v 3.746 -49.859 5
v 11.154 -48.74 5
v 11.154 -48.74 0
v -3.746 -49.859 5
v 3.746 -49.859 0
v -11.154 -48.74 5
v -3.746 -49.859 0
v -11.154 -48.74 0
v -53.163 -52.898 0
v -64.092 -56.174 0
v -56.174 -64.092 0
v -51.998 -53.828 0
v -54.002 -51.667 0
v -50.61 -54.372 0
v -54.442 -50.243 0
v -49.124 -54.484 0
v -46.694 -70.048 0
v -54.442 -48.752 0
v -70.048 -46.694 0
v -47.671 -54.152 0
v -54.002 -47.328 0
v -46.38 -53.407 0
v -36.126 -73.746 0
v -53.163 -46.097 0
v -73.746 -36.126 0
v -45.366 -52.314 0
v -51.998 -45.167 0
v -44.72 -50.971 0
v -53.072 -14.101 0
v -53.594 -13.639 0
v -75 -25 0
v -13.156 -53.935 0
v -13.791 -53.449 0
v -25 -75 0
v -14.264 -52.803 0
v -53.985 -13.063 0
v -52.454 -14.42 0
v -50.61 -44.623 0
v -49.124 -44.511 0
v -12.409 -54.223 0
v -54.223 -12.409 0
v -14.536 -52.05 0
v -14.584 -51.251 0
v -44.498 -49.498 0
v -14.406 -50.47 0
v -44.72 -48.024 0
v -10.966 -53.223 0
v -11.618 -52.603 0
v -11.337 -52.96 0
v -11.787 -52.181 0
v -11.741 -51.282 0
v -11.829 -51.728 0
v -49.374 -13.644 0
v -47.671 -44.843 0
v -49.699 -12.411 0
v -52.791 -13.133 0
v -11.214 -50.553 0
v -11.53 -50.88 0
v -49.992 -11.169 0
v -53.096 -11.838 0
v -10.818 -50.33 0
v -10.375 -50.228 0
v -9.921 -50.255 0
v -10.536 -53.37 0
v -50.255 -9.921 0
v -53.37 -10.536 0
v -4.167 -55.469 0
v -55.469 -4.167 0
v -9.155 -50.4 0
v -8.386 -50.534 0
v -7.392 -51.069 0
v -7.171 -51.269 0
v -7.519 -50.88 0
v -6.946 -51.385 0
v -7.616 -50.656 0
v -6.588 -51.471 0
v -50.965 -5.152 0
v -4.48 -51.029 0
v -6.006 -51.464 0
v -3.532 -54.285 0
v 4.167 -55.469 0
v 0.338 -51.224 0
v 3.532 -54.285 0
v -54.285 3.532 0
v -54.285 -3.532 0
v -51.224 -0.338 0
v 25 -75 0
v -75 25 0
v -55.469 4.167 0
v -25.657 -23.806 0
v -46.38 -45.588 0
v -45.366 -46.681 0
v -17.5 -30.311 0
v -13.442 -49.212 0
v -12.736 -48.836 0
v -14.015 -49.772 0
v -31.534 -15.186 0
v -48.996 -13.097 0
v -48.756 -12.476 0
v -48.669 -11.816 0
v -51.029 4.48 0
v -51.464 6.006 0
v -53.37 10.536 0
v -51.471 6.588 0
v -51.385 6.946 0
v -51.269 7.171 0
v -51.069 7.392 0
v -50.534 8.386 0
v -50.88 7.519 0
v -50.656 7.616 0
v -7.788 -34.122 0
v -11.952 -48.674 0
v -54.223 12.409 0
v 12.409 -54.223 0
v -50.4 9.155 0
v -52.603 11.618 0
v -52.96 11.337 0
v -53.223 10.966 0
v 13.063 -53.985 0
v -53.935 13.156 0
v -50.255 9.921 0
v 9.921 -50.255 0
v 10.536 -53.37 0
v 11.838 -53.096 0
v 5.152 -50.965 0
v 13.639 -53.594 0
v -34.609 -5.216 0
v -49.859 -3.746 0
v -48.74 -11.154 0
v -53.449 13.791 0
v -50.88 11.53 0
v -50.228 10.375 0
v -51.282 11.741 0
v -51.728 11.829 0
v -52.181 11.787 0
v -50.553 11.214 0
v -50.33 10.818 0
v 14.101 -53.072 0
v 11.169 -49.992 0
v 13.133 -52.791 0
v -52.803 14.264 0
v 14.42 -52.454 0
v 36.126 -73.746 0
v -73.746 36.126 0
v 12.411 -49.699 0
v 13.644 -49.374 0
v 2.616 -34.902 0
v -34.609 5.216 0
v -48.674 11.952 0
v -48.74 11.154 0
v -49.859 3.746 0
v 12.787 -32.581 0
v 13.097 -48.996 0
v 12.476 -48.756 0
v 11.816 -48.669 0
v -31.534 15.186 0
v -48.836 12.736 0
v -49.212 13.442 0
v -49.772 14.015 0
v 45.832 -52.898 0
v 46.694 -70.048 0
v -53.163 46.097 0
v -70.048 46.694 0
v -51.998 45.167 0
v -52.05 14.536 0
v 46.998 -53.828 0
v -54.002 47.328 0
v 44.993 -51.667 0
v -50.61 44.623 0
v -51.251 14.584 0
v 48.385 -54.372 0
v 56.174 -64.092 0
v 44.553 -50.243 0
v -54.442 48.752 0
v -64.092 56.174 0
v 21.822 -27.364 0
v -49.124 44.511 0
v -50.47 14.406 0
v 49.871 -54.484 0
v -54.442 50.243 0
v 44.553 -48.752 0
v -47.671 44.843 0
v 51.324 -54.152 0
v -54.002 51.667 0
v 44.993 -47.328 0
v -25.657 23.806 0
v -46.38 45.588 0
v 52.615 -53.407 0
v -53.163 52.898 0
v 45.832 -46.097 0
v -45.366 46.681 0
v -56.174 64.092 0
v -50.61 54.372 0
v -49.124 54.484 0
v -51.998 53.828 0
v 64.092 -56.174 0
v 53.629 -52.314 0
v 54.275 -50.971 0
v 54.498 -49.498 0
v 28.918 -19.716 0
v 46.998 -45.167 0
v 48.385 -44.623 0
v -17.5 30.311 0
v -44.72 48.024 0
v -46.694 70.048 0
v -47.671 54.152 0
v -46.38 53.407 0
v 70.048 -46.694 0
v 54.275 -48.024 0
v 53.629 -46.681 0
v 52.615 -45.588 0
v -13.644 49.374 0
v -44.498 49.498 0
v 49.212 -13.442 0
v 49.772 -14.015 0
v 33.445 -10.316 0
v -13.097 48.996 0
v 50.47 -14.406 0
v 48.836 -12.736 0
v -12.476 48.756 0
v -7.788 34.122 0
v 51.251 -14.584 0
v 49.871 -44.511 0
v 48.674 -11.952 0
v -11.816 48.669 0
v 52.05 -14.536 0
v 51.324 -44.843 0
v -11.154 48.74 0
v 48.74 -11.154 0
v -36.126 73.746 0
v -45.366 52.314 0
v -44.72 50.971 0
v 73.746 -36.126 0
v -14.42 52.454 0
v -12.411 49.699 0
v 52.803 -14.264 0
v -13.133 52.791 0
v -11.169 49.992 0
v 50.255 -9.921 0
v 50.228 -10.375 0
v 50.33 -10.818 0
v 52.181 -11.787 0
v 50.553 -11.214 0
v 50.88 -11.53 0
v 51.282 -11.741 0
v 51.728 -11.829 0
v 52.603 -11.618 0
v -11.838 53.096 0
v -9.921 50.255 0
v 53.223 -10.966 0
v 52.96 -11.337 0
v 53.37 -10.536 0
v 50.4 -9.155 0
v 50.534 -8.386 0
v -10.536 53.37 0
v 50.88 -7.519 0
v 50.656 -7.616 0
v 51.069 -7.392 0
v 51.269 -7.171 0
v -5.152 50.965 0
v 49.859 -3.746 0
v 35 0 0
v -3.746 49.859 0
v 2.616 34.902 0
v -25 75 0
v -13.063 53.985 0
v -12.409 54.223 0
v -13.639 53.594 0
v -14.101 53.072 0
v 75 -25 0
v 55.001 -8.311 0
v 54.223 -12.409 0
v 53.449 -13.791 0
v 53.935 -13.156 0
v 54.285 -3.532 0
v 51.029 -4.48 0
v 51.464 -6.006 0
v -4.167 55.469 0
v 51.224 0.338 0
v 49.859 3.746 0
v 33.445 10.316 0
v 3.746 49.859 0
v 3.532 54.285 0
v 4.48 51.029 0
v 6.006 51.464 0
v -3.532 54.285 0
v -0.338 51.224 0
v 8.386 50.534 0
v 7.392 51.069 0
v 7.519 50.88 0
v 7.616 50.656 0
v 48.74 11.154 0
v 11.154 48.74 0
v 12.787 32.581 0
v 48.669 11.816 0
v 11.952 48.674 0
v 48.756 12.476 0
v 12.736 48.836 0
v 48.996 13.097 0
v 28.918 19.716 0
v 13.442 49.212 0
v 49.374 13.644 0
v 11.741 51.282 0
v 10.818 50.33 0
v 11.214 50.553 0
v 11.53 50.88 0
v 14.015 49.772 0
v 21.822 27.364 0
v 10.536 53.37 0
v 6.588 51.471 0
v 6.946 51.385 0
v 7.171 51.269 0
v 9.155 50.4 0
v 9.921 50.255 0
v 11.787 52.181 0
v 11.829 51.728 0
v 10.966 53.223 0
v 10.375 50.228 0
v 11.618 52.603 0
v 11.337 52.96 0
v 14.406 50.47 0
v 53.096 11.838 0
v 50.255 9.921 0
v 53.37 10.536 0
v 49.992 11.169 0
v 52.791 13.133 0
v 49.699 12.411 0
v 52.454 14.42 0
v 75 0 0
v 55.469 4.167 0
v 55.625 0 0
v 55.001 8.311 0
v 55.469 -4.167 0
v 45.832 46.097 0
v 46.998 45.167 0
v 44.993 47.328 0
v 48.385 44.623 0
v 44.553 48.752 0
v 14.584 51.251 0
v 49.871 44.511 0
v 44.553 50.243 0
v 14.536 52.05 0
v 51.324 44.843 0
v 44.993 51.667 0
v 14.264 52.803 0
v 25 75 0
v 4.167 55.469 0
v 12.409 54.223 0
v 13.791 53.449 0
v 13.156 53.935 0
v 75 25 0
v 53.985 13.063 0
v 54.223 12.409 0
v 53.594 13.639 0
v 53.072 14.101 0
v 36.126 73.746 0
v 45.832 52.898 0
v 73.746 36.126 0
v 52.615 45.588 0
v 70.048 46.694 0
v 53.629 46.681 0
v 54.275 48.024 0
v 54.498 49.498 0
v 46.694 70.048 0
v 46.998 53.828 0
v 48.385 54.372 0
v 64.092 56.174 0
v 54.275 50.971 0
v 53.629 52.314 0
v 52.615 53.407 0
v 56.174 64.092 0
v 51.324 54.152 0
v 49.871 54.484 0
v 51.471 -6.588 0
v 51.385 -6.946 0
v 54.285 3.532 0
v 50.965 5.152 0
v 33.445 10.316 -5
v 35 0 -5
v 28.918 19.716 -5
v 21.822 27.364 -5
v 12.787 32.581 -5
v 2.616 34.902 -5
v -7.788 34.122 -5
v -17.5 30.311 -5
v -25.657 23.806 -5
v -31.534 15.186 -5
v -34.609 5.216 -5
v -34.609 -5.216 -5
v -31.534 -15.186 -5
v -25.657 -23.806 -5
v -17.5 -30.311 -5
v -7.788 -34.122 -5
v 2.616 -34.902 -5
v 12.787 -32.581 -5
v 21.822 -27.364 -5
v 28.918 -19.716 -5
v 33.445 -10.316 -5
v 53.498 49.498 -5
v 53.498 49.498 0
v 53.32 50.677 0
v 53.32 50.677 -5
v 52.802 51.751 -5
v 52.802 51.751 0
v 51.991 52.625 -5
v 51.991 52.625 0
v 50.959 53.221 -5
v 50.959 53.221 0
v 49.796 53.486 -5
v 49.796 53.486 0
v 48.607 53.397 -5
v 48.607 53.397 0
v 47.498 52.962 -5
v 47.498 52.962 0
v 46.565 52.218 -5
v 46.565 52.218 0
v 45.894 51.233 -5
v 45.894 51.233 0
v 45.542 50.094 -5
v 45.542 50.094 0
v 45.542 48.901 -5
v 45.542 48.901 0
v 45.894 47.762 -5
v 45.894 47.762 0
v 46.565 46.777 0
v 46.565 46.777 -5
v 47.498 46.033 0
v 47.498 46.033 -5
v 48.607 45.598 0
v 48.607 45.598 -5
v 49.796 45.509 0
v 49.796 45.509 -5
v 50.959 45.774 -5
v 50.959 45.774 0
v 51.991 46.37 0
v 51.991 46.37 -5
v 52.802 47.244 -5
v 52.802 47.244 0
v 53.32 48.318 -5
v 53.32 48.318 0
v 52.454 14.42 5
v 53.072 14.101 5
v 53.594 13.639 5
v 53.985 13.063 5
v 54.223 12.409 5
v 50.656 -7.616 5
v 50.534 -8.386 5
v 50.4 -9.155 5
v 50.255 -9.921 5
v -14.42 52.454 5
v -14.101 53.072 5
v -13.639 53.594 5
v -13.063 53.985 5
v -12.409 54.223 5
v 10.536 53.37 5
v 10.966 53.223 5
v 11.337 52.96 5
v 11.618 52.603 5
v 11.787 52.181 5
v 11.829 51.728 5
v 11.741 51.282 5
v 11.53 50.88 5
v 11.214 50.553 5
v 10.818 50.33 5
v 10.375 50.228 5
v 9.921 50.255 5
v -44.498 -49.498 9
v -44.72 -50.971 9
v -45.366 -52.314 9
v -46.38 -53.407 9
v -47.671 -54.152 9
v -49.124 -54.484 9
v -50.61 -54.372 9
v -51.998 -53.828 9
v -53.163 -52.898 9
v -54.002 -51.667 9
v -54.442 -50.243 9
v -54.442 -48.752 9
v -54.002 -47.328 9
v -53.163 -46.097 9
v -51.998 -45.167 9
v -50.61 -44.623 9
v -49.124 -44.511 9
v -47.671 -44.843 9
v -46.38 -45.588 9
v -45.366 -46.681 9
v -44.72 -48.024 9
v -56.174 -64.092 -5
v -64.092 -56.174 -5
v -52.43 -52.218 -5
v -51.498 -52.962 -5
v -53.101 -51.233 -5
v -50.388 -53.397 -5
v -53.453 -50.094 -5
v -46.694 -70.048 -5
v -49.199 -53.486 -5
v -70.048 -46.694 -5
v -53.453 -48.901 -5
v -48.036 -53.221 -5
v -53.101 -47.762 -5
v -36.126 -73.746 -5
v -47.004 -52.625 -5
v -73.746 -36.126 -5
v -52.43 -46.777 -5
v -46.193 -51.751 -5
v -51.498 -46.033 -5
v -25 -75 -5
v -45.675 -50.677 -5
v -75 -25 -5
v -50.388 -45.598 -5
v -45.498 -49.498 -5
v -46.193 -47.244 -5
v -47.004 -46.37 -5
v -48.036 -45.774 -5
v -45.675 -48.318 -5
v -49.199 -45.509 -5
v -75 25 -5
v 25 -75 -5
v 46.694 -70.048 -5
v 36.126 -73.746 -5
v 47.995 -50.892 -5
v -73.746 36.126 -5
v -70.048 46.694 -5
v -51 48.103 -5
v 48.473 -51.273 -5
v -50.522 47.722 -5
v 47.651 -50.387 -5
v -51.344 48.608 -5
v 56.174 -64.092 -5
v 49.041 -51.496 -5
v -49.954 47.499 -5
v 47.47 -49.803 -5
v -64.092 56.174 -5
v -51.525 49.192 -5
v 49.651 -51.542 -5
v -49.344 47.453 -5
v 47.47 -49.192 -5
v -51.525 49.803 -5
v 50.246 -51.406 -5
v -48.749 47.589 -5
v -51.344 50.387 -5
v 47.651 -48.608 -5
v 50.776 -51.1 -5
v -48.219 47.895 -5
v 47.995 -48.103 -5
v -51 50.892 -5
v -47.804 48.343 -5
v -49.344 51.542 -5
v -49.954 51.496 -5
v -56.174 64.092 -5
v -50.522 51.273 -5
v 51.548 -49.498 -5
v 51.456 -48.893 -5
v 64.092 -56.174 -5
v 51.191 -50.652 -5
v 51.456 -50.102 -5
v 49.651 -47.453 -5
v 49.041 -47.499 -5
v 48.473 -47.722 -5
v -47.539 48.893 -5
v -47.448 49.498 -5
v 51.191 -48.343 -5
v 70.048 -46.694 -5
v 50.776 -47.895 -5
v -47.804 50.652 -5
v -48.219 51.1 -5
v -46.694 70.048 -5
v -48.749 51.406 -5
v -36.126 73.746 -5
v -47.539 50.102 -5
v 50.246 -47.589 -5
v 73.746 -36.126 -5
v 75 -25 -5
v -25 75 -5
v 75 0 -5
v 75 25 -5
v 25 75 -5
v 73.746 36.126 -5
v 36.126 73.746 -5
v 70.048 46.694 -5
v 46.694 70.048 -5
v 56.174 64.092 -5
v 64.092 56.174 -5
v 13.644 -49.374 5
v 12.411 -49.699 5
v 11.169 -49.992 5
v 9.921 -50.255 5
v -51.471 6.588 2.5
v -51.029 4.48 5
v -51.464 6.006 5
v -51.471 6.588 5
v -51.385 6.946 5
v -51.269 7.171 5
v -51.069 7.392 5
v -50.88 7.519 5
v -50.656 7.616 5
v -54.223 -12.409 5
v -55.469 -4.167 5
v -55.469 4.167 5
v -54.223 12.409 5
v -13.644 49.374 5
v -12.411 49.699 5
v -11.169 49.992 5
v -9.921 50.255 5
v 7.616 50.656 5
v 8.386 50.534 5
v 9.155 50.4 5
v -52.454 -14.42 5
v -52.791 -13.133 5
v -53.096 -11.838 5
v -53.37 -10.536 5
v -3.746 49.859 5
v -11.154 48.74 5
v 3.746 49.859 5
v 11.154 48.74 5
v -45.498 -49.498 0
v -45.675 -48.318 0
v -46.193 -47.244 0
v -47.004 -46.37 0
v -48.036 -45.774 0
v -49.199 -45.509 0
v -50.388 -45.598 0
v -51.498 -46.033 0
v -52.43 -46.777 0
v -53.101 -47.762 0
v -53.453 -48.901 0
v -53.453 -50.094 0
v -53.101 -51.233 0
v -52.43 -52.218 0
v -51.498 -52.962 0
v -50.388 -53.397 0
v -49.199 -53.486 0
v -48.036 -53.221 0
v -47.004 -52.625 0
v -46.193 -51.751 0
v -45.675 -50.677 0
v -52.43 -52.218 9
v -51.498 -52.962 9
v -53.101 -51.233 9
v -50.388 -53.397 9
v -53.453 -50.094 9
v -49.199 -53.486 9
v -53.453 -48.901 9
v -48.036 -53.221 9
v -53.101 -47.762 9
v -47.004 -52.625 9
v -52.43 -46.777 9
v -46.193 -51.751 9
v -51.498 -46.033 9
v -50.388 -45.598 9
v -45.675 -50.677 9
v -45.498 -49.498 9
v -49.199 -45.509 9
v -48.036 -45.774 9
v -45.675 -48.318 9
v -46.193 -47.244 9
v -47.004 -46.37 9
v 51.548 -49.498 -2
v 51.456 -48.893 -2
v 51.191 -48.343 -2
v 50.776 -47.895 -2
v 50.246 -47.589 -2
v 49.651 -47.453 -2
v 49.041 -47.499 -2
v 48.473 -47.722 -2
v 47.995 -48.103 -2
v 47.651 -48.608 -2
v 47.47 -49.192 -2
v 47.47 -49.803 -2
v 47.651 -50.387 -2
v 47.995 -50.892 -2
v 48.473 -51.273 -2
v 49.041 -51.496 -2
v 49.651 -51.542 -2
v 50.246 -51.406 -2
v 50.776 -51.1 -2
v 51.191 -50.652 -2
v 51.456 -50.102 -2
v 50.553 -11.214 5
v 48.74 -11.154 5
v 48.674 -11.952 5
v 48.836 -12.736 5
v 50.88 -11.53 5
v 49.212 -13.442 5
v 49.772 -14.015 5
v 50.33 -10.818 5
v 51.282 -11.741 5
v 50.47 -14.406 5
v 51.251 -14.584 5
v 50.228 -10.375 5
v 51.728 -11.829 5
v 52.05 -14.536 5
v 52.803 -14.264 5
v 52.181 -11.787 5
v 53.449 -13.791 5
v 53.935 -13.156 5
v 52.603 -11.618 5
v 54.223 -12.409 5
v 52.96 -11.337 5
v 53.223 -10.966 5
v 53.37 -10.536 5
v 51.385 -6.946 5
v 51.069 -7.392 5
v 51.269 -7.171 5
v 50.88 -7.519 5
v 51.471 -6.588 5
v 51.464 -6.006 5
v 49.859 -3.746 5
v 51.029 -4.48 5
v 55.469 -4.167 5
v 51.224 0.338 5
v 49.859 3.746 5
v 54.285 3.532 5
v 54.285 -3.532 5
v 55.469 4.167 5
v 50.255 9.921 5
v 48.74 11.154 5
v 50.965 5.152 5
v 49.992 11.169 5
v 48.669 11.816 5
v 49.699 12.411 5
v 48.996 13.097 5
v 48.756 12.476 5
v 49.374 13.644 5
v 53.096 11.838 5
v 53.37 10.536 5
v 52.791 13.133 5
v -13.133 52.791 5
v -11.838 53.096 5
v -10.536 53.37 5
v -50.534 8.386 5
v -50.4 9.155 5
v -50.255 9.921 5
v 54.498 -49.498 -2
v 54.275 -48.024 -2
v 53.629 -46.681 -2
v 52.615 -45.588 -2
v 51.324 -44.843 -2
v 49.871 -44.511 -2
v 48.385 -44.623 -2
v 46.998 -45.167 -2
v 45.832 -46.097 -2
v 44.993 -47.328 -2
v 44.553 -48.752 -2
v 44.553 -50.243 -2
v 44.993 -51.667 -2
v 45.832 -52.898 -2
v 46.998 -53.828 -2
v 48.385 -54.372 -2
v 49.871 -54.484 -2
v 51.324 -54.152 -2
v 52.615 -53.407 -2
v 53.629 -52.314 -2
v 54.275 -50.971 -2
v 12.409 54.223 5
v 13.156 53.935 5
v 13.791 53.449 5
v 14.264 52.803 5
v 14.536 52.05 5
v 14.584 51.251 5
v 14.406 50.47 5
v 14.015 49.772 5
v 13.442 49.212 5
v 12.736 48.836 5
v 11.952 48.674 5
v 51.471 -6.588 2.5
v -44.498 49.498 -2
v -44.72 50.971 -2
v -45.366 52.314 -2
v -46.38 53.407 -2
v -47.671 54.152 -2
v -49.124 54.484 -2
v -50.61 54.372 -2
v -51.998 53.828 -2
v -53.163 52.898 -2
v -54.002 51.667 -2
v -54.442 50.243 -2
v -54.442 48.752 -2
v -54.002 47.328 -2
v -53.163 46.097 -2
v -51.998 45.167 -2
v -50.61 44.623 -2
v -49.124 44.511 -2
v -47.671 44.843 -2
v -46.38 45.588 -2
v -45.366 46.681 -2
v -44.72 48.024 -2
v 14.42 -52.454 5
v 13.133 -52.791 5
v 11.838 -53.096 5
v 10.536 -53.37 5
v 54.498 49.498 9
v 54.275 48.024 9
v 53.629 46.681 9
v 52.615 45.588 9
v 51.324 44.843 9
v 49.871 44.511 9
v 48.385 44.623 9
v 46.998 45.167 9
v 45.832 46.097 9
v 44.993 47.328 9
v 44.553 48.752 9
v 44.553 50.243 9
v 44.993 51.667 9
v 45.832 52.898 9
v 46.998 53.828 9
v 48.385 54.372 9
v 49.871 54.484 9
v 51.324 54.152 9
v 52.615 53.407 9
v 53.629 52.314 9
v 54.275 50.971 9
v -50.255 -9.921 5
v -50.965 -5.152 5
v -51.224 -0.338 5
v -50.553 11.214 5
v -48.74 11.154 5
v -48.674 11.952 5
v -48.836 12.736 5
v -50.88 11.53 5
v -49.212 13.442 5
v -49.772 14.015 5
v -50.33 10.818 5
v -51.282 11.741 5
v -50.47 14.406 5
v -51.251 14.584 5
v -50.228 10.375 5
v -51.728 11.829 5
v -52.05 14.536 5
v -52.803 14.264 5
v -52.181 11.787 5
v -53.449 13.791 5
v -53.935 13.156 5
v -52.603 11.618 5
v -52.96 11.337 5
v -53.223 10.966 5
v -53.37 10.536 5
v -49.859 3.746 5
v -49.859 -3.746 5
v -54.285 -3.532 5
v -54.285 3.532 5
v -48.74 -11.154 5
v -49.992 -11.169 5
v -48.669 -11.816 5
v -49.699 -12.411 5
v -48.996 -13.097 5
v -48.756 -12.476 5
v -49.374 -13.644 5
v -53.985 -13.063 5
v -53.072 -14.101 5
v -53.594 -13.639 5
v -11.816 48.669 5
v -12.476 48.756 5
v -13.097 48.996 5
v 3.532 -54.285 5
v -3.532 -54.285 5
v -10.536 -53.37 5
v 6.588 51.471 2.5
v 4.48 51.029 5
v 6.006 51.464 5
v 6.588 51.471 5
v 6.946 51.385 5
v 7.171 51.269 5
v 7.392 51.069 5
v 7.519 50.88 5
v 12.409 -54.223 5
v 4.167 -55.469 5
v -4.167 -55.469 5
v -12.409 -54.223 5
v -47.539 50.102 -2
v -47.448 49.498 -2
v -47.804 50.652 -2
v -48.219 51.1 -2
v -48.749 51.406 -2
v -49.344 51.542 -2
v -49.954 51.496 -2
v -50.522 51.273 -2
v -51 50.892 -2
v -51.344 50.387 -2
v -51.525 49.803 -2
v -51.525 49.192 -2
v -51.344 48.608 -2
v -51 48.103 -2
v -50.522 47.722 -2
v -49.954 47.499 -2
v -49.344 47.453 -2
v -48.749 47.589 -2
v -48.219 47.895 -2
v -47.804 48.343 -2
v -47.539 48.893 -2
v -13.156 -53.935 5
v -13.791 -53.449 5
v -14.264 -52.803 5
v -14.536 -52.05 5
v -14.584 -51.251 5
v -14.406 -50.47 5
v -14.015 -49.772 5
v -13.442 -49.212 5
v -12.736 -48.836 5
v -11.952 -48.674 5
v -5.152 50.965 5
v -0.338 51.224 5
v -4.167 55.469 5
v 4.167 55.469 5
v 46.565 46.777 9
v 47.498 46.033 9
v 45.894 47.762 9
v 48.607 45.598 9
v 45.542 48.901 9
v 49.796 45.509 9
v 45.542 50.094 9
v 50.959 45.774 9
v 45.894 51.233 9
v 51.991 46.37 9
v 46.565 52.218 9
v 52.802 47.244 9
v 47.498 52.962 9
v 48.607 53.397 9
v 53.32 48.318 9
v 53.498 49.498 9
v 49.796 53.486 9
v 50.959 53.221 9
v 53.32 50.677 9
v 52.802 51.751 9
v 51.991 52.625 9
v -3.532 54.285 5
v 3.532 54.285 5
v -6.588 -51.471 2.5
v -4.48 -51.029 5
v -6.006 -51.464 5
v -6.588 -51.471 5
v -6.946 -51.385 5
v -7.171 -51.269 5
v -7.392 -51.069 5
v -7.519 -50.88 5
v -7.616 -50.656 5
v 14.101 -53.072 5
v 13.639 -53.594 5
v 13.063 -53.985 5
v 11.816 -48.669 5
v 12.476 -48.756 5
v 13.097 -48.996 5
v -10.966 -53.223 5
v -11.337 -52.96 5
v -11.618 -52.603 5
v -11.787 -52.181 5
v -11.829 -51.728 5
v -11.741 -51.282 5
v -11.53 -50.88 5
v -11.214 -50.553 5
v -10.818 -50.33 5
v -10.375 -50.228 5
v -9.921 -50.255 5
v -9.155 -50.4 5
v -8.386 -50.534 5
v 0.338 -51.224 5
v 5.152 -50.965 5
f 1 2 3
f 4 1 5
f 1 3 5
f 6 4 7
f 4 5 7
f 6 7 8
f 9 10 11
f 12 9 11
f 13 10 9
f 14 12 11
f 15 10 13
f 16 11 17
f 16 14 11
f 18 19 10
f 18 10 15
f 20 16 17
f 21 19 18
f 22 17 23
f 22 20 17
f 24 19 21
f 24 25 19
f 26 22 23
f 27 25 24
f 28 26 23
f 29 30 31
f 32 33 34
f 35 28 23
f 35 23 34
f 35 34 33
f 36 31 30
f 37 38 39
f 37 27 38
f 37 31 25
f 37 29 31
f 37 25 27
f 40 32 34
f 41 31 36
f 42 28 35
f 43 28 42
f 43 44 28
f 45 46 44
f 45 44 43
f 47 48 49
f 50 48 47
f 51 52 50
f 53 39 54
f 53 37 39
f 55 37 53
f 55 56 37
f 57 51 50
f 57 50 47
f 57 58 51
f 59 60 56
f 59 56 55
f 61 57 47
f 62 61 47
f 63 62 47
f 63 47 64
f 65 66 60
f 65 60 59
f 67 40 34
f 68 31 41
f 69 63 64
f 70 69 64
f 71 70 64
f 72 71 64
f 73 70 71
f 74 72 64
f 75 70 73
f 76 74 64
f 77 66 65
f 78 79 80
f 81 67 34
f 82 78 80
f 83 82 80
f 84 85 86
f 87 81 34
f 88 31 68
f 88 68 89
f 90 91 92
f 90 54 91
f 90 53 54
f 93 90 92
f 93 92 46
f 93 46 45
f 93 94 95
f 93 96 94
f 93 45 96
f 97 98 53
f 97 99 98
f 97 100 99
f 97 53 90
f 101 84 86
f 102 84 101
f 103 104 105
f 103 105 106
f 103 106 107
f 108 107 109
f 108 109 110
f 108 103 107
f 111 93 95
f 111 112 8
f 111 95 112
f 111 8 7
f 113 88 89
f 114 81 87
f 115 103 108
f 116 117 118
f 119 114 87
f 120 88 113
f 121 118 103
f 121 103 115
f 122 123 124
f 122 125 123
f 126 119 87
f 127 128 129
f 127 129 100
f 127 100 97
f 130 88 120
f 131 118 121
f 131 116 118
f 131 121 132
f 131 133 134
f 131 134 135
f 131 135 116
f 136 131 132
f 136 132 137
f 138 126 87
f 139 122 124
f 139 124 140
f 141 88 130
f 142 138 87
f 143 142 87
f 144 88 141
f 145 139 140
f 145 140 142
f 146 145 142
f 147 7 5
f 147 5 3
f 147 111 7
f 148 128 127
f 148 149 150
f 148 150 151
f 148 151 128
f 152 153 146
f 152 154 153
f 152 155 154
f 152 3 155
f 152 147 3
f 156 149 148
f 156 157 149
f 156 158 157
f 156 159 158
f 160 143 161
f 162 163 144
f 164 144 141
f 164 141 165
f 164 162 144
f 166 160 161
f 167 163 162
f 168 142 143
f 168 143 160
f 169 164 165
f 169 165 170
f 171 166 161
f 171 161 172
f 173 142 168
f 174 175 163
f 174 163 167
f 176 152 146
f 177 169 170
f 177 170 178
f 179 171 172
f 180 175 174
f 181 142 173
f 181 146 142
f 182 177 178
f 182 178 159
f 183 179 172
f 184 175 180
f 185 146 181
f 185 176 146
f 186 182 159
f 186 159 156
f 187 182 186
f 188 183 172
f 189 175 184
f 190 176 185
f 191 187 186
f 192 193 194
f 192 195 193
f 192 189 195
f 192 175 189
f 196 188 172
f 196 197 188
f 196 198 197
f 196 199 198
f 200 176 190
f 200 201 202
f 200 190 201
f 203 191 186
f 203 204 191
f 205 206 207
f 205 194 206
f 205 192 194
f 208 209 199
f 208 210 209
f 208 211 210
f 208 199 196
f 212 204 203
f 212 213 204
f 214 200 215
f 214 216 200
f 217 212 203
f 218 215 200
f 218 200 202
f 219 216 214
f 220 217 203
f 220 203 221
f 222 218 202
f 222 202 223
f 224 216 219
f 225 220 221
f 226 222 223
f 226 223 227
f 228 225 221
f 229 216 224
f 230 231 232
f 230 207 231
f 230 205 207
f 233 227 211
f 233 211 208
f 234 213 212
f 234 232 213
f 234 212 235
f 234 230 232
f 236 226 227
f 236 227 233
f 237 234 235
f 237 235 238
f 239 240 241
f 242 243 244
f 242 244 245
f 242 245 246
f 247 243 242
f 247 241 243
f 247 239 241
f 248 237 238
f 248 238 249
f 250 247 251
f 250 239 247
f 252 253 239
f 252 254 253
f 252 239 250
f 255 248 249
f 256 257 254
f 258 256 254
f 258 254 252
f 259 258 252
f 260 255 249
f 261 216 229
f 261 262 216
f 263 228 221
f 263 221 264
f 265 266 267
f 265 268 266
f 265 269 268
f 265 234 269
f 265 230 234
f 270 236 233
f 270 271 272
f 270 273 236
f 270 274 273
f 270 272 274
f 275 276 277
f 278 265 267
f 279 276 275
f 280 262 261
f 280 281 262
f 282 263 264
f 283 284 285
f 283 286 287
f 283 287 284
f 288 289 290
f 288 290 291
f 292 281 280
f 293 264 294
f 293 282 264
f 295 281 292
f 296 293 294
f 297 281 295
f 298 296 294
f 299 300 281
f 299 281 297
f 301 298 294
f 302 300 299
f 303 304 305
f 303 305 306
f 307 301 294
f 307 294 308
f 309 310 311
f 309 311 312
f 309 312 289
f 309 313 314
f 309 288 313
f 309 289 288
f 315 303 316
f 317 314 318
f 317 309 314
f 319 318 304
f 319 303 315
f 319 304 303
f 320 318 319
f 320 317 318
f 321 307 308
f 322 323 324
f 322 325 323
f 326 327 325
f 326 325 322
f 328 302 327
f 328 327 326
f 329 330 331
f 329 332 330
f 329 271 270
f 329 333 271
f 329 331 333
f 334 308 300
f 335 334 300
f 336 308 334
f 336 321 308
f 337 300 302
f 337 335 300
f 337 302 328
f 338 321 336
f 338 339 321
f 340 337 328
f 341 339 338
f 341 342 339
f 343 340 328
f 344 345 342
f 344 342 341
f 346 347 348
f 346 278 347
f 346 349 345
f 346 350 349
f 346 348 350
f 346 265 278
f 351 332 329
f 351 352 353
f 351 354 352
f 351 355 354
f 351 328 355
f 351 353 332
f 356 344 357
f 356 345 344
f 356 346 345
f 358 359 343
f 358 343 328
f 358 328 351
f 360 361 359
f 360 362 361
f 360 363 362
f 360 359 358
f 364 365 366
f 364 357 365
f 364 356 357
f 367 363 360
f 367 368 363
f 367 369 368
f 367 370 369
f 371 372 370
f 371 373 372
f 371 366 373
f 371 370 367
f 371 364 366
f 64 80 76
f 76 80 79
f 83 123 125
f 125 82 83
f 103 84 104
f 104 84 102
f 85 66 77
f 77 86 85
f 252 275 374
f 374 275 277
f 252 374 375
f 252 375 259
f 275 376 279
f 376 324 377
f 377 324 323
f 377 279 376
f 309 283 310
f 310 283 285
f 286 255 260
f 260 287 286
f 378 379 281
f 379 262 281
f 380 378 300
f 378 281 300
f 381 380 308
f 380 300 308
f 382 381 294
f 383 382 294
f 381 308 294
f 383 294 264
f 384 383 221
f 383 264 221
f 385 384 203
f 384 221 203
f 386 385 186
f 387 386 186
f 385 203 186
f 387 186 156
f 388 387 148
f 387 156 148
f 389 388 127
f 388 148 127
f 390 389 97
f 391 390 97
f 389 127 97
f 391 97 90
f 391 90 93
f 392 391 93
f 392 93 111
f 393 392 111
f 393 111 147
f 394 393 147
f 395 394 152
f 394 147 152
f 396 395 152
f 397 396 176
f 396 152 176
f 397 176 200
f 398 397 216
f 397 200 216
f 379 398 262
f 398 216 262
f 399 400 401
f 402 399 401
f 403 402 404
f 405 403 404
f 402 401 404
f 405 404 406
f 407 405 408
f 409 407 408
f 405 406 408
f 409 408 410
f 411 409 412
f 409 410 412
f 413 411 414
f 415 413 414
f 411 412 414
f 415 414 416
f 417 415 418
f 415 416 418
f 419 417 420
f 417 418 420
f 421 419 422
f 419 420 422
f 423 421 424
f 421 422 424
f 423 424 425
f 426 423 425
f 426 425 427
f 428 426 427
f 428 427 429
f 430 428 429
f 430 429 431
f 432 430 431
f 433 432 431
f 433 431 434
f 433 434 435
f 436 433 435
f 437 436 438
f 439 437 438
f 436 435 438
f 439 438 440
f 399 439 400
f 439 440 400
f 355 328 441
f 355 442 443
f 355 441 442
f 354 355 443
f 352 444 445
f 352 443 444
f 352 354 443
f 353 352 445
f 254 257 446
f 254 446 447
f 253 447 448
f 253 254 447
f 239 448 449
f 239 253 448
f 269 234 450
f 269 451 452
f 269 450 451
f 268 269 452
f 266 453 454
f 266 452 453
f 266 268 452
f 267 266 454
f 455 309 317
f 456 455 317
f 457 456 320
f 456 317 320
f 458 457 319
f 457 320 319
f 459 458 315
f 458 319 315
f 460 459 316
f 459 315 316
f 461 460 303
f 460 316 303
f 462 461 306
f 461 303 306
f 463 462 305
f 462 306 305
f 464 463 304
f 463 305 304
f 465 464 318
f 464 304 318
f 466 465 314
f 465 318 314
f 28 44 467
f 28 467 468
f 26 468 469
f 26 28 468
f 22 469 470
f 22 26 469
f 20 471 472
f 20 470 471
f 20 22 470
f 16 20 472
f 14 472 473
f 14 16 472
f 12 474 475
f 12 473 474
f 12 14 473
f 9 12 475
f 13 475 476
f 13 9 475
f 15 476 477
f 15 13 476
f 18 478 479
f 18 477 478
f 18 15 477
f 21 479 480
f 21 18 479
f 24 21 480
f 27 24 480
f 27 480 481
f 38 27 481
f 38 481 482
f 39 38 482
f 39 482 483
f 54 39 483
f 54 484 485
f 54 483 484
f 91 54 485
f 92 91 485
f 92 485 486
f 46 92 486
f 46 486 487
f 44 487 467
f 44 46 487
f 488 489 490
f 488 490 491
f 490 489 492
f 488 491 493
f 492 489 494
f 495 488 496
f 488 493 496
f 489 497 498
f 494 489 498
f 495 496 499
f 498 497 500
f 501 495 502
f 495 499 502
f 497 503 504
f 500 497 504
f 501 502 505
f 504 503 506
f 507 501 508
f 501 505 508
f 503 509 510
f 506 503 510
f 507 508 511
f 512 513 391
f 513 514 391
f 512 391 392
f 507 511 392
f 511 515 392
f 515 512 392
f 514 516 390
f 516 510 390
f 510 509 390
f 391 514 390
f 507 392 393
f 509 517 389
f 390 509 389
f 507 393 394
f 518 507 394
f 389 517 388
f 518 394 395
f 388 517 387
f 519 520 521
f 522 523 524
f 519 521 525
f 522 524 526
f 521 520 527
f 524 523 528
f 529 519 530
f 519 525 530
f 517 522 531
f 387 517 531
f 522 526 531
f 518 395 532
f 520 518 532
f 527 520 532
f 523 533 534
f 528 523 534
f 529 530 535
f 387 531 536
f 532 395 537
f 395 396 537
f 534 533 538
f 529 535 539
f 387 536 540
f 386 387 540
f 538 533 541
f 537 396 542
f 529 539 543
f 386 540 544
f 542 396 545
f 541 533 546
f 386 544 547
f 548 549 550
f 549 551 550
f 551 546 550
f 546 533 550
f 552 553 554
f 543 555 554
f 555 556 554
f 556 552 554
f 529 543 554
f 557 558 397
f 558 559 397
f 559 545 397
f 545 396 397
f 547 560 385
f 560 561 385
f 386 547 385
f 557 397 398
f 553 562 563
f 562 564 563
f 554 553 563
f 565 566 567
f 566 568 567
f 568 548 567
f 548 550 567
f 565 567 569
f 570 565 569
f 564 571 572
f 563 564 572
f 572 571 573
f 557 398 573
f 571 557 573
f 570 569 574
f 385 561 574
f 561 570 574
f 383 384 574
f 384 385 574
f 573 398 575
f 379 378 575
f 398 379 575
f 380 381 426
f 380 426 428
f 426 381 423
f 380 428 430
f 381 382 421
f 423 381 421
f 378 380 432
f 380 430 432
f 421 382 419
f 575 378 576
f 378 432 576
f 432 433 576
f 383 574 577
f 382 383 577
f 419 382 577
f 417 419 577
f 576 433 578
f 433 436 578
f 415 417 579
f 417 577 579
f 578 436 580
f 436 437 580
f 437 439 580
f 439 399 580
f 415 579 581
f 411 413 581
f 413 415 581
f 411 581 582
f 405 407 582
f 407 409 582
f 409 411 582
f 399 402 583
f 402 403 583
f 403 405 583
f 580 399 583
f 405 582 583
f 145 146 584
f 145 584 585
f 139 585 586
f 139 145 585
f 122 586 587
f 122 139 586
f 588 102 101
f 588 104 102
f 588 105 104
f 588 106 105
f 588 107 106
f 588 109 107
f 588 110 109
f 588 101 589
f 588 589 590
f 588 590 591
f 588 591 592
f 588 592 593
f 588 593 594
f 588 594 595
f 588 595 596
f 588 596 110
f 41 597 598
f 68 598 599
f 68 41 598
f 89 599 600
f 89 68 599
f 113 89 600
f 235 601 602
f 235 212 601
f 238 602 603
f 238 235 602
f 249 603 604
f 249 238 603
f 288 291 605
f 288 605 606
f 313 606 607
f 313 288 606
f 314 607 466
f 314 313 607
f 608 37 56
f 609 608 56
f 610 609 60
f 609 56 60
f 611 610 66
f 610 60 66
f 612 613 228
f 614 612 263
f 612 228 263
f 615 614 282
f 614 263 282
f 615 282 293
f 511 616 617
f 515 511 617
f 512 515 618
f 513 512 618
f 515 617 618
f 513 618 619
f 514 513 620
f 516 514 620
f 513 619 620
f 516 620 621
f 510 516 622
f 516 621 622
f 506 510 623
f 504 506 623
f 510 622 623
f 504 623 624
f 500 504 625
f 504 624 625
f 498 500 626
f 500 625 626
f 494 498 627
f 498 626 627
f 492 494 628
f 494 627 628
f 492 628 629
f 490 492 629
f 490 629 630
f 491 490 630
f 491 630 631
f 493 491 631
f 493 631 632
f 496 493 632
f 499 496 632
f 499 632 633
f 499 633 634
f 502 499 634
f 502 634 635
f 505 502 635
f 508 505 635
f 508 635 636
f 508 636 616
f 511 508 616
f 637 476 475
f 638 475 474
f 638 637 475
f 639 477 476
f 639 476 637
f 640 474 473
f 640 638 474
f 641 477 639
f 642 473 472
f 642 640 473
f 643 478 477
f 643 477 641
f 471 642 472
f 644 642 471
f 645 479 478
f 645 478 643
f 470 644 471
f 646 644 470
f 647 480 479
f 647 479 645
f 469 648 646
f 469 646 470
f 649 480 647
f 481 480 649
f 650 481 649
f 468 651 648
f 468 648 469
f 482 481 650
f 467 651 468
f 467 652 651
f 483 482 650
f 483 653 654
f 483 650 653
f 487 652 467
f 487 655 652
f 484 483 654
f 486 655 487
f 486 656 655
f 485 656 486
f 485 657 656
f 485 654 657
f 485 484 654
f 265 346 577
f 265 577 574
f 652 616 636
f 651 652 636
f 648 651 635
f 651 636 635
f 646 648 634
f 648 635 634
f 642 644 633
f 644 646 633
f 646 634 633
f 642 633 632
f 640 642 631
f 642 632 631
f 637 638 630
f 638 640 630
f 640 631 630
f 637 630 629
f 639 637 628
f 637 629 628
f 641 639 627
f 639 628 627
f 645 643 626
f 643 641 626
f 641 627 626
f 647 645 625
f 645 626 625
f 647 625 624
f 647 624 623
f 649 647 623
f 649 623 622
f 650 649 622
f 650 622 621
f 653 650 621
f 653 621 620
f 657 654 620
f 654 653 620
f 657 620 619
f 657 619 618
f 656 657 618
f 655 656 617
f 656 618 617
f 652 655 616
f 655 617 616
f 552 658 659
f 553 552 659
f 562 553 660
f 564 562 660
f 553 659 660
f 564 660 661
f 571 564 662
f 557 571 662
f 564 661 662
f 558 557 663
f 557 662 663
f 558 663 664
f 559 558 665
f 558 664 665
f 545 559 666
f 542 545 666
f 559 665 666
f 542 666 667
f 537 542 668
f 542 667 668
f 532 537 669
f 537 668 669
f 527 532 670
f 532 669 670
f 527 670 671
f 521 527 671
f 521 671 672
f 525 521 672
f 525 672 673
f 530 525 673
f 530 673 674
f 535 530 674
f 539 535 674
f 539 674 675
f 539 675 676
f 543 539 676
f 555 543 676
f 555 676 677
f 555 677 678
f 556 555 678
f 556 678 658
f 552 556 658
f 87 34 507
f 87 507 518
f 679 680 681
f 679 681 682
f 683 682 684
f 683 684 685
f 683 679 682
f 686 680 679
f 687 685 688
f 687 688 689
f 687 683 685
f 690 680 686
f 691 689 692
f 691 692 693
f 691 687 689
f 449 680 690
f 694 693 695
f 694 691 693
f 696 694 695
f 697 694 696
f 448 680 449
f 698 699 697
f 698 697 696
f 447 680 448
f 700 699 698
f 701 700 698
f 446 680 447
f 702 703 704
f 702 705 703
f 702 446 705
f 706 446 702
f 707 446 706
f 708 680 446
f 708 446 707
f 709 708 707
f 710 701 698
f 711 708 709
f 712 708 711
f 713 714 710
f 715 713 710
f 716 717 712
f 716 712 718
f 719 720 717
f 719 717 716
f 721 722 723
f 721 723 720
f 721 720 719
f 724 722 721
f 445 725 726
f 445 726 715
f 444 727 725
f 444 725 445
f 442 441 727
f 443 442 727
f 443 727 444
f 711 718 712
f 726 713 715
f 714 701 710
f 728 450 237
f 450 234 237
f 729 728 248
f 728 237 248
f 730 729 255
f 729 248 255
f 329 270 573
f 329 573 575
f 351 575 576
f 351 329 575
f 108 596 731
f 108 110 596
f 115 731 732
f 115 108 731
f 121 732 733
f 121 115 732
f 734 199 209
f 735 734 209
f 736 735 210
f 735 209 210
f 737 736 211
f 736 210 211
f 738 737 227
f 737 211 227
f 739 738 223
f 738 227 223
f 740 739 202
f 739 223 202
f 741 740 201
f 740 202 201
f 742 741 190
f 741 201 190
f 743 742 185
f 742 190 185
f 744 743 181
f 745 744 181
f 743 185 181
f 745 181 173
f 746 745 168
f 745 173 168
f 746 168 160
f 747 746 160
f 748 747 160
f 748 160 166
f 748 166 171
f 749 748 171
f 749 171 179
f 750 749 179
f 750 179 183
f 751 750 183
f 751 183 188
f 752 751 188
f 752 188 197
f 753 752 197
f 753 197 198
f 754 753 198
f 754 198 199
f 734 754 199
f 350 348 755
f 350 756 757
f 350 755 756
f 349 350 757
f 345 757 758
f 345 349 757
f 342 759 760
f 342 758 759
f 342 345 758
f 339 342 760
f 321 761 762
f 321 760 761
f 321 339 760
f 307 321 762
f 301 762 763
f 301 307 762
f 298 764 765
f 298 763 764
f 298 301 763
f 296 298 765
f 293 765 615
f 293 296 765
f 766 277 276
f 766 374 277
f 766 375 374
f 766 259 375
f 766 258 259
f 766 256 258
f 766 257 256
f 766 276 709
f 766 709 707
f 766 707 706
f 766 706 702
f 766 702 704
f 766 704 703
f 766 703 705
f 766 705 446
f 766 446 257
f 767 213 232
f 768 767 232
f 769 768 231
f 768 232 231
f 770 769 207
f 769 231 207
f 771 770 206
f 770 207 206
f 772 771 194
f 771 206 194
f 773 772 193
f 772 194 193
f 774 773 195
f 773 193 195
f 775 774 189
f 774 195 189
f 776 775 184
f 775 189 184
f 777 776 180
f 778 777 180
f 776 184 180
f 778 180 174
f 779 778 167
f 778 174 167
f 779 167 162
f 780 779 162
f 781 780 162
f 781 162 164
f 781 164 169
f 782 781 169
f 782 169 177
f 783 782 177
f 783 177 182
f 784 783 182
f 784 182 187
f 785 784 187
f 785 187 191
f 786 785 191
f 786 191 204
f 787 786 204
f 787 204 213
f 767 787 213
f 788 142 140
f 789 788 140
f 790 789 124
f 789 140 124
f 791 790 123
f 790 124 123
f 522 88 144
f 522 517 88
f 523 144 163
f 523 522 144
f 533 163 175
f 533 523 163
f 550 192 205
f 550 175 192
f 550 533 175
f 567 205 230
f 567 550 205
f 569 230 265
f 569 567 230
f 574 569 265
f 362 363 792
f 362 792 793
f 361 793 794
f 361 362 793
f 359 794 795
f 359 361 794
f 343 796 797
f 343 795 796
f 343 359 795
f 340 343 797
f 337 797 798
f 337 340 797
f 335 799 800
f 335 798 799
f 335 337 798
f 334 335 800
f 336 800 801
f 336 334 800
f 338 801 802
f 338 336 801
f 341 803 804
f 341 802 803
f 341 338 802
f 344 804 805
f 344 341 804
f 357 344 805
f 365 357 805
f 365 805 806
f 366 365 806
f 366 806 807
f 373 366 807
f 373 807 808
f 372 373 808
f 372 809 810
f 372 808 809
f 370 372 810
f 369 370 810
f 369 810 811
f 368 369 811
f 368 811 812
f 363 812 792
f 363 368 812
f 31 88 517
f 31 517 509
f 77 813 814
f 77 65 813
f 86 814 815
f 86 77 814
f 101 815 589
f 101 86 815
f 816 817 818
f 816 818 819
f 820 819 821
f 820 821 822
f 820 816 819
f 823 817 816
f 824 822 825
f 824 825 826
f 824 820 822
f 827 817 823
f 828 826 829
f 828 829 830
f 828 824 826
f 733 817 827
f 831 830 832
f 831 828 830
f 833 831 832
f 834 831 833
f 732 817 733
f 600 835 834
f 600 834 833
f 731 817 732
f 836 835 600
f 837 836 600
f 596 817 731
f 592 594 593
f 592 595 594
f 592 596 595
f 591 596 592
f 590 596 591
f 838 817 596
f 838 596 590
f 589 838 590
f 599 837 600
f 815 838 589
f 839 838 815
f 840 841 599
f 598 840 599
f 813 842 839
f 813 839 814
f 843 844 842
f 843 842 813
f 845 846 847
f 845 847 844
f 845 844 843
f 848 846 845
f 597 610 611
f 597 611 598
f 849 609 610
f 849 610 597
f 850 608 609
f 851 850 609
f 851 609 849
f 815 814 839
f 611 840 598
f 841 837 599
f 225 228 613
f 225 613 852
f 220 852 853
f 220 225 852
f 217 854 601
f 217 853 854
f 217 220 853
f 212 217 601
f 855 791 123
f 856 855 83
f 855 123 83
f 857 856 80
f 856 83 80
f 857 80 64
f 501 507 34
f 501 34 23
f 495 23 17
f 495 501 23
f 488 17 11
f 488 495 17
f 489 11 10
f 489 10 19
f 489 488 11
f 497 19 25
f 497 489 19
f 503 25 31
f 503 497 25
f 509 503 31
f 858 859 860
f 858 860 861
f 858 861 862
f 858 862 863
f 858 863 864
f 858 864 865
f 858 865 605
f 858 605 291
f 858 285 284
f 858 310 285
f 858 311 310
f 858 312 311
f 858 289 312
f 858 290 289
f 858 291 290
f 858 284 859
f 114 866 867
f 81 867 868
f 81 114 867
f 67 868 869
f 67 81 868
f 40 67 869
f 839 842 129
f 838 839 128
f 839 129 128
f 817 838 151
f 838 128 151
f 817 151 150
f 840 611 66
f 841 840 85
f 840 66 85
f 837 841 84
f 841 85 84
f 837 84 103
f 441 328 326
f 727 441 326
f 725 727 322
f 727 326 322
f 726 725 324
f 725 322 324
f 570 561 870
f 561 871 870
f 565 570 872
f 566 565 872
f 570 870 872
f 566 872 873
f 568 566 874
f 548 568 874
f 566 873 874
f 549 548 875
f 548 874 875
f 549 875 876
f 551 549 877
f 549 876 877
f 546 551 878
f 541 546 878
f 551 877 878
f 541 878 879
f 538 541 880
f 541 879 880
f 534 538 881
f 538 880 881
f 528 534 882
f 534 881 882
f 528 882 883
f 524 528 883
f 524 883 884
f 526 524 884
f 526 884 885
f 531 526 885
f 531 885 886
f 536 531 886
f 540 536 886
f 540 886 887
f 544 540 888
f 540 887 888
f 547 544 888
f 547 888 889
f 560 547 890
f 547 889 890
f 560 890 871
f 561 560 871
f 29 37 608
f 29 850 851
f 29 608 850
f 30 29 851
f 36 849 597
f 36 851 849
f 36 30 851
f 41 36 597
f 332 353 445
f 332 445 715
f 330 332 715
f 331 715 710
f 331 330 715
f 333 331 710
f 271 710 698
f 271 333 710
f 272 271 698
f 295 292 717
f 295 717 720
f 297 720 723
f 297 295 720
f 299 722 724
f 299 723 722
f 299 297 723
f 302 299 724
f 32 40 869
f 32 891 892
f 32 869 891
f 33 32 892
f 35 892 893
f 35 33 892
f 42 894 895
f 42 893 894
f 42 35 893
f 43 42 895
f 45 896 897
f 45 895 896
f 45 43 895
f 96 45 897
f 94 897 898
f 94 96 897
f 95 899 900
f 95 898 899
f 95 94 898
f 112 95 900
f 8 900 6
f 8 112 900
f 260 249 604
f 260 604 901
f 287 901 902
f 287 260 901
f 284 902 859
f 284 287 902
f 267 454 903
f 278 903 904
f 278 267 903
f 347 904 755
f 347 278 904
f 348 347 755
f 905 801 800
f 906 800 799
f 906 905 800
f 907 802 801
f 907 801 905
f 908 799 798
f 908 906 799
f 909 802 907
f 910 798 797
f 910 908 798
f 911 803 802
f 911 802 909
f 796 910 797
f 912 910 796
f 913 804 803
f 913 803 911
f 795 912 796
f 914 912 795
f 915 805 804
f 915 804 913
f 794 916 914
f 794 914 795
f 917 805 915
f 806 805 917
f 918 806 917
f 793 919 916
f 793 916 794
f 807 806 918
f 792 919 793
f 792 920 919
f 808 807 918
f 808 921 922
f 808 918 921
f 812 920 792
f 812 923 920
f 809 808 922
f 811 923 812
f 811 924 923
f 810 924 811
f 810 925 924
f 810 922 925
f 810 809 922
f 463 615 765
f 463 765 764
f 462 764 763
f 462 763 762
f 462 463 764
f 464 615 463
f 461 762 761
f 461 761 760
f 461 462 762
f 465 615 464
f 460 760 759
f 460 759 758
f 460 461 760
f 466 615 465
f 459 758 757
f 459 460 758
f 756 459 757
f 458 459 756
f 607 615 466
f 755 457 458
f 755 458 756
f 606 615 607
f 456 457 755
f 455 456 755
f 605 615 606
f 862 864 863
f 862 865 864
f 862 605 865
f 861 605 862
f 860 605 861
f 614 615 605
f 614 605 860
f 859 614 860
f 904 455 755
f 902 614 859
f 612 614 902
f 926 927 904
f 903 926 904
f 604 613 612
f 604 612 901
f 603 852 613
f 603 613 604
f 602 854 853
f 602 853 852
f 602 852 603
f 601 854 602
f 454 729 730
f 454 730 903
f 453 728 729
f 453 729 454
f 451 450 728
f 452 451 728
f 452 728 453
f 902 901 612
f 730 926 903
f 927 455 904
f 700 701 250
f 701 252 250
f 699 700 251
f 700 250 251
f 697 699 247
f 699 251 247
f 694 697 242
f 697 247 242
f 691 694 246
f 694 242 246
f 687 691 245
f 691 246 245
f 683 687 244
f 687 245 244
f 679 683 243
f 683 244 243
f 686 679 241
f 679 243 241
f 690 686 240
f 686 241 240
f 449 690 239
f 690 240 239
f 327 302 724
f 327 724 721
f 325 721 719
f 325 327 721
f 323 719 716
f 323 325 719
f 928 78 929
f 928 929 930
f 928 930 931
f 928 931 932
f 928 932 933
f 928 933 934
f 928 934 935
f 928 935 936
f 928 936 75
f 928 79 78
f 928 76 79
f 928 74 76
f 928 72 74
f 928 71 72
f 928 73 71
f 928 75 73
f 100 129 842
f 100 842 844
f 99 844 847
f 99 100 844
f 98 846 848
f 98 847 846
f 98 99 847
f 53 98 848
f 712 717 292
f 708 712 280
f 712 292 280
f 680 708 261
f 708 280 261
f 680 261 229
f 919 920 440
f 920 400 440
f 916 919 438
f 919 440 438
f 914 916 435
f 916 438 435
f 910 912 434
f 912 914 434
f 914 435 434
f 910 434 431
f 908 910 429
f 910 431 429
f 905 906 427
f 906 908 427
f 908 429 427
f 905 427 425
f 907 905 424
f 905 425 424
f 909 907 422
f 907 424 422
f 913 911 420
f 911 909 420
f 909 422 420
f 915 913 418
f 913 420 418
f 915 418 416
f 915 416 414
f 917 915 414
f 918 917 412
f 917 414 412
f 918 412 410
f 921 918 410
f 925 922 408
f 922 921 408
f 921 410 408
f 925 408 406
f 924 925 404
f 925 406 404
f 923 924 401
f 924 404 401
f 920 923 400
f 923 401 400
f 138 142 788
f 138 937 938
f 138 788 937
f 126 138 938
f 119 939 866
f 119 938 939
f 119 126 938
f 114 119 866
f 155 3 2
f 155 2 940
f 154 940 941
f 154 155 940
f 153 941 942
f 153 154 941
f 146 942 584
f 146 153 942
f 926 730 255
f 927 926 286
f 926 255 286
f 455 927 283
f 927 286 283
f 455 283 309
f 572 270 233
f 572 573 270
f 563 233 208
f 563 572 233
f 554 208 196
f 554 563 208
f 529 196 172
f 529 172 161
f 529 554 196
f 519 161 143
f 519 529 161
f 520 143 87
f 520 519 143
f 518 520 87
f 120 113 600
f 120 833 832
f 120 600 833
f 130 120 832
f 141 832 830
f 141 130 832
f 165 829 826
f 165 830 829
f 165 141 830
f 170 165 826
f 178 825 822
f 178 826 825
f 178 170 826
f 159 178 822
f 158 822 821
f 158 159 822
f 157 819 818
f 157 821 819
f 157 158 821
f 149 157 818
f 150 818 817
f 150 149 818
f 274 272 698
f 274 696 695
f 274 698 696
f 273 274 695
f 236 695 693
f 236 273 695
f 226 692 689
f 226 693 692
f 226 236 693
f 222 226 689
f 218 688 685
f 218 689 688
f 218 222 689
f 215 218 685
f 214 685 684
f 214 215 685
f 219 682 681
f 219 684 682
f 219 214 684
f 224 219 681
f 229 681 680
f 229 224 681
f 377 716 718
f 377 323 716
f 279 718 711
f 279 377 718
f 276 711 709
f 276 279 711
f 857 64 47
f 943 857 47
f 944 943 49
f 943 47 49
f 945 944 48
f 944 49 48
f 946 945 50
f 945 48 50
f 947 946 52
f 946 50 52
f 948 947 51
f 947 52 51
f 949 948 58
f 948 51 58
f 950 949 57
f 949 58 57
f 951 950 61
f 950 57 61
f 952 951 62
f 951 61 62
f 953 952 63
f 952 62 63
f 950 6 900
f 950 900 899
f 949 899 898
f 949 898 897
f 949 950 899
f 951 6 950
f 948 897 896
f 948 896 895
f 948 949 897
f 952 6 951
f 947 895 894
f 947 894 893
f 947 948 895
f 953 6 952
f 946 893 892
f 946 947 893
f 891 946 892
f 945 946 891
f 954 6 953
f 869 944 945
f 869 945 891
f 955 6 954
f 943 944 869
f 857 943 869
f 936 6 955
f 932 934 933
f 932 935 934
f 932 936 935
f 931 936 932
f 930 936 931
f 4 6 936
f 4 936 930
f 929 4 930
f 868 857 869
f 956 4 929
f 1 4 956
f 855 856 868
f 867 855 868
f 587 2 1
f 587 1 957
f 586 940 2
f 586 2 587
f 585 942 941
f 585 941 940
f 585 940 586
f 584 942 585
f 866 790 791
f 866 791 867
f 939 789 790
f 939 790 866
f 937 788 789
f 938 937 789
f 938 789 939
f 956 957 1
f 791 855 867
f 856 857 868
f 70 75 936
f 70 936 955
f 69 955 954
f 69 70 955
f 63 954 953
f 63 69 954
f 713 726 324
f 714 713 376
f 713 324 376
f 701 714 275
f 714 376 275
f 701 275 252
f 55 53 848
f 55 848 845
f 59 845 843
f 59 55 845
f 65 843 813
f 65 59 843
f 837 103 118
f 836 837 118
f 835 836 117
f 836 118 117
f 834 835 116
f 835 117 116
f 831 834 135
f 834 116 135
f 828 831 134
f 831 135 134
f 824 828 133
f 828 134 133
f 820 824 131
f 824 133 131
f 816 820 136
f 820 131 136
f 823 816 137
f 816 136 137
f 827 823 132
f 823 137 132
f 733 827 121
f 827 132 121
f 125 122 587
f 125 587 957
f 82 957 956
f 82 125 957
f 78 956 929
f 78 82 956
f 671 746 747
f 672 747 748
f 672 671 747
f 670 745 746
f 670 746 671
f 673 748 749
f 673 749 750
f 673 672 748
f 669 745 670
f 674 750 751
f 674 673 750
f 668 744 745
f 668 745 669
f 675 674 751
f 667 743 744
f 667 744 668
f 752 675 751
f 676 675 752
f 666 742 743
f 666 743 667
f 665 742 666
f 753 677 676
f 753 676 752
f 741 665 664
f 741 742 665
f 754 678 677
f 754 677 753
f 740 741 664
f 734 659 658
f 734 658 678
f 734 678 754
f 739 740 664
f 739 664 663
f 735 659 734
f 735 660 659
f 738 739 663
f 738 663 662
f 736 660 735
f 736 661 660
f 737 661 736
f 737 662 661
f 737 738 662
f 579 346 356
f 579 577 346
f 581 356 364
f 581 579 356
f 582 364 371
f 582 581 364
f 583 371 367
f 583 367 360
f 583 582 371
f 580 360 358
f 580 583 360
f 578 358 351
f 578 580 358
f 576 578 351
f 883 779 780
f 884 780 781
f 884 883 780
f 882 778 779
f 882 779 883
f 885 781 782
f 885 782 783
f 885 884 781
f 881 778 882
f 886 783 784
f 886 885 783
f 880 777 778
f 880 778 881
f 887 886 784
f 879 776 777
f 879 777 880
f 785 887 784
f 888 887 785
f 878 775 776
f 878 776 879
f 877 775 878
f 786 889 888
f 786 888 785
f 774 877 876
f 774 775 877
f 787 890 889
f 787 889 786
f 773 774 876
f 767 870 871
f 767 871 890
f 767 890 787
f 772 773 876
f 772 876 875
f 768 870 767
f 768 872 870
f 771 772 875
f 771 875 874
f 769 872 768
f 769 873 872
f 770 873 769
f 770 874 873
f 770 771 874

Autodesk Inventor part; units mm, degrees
ref_plane "YZ Plane" through (0, 0, 0) normal (1, 0, 0) x (0, 1, 0)
ref_plane "XZ Plane" through (0, 0, 0) normal (0, 1, 0) x (-1, 0, 0)
ref_plane "XY Plane" through (0, 0, 0) normal (0, 0, 1) x (1, 0, 0)
sketch "Sketch1" plane through (0, 0, 0) normal (0, 0, 1) x (1, 0, 0)
  line L0 (-75, -75) -> (75, -75)
  line L1 (75, -75) -> (75, 75)
  line L2 (75, 75) -> (-75, 75)
  line L3 (-75, 75) -> (-75, -75)
  line L4 (-75, -75) -> (75, 75) construction
  line L5 (75, -75) -> (-75, 75) construction
  arc A0 (51.4783, -11.796) -> (51.4817, 11.7813) centre (0, 0) ccw
  arc A1 (53.3699, -10.5361) -> (53.3699, 10.5361) centre (0, 0) ccw
  arc A2 (50.2551, -9.9212) -> (50.2551, 9.9212) centre (0, 0) ccw
  arc A3 (53.3699, 10.5361) -> (50.2551, 9.9212) centre (51.8125, 10.2286) ccw
  arc A4 (50.2551, -9.9212) -> (53.3699, -10.5361) centre (51.8096, -10.2434) ccw
  line L6 (0, 0) -> (120.3079, 0)
  spline S0 degree 2 poles (51.0287, -4.4801) (52.1004, -7.1283) (50.6557, -7.6159) knots 0 0 0 1 1 1
  arc A5 (54.2233, -12.4087) -> (54.2233, 12.4087) centre (0, 0) ccw
  arc A6 (48.74, -11.1539) -> (48.74, 11.1539) centre (0, 0) ccw
  arc A7 (54.2233, 12.4087) -> (48.74, 11.1539) centre (51.4817, 11.7813) ccw
  arc A8 (48.74, -11.1539) -> (54.2233, -12.4087) centre (51.4817, -11.7813) ccw
  arc A9 (53.3639, -10.5665) -> (52.4539, 14.4204) centre (0, 0) ccw
  arc A10 (50.2494, -9.9498) -> (49.3745, 13.6441) centre (0, 0) ccw
  circle A11 centre (49.4975, 49.4975) radius 5
  circle A12 centre (-49.4975, -49.4975) radius 5
  circle A13 centre (49.4975, 49.4975) radius 4
  circle A14 centre (-49.4975, -49.4975) radius 4
  point P0 (52.8125, 0)
  point P1 (28.5375, -29.3076)
  point P2 (51.5021, -11.8009)
  point P3 (51.4042, -6.894)
  point P4 (53.3699, 10.5361)
  point P5 (50.2551, 9.9212)
  dimension "d0" = 150
  dimension "d1" = 150
  dimension "d2" = 52.8125
  dimension "d6" = 102.45
  dimension "d7" = 108.8
  dimension "d8" = 4.185
  dimension "d12" = 111.25
  dimension "d13" = 100
  dimension "d21" = 10
  dimension "d22" = 10
  dimension "d23" = 8
  dimension "d24" = 8
  dimension "d39" = 70
  dimension "d40" = 70
extrude "Extrusion1" add sketch "Sketch1" against normal blind 5 contours A5 A8 A6 L6 A2 A4 A1 | L6 A1 A9 A7 A5 | L3 L2 L1 L0 | L6 A0 A3 A1 | A1 A4 A0 L6 | A3 A10 A7 A9 | L6 A2 A3 A0 | A0 A4 A2 S0 L6 | L6 A6 A7 A10 A2 | S0 A2 | A11 | A12 | A13 | A14
extrude "Extrusion2" add sketch "Sketch1" along normal blind 5 contours A5 A8 A6 L6 A2 A4 A1 | L6 A1 A9 A7 A5 | L6 A6 A7 A10 A2 | S0 A2
pattern_circular "Circular Pattern1" count 4 over 360 about axis through (0, 0, -10) along (0, 0, 1) of "Extrusion2"
extrude "Extrusion4" add sketch "Sketch1" along normal blind 9 contours A11 | A12
extrude "Extrusion5" cut sketch "Sketch1" against normal through all contours A13 | A14
fillet "Fillet1" radius 50 4 edges at (-75, 75, -2.5) (75, 75, -2.5) (75, -75, -2.5) (-75, -75, -2.5)
sketch "Sketch3" plane through (0, 0, 0) normal (0, 0, 1) x (1, 0, 0)
  circle A0 centre (0, 0) radius 35
  circle A1 centre (49.4975, 49.4975) radius 5 projected
  line L0 (-49.4975, -49.4975) -> (49.4975, 49.4975) construction
  line L1 (49.4975, -49.4975) -> (-49.4975, 49.4975) construction
  circle A2 centre (-49.4975, 49.4975) radius 2.05
  circle A3 centre (49.4975, -49.4975) radius 2.05
  circle A4 centre (-49.4975, 49.4975) radius 5
  circle A5 centre (49.4975, -49.4975) radius 5
  dimension "d30" = 70
  dimension "d31" = 4.1
  dimension "d32" = 4.1
  dimension "d33" = 10
  dimension "d34" = 10
  dimension "d41" = 70
extrude "Extrusion6" cut sketch "Sketch3" against normal through all contours A0 | A2 | A3
extrude "Extrusion7" cut sketch "Sketch3" against normal blind 2 contours A3 | A4 | A5
equation "\"d22\" = d21"
equation "\"d24\" = d23"
equation "\"d40\" = d39"
properties part number "Female plug&play"
